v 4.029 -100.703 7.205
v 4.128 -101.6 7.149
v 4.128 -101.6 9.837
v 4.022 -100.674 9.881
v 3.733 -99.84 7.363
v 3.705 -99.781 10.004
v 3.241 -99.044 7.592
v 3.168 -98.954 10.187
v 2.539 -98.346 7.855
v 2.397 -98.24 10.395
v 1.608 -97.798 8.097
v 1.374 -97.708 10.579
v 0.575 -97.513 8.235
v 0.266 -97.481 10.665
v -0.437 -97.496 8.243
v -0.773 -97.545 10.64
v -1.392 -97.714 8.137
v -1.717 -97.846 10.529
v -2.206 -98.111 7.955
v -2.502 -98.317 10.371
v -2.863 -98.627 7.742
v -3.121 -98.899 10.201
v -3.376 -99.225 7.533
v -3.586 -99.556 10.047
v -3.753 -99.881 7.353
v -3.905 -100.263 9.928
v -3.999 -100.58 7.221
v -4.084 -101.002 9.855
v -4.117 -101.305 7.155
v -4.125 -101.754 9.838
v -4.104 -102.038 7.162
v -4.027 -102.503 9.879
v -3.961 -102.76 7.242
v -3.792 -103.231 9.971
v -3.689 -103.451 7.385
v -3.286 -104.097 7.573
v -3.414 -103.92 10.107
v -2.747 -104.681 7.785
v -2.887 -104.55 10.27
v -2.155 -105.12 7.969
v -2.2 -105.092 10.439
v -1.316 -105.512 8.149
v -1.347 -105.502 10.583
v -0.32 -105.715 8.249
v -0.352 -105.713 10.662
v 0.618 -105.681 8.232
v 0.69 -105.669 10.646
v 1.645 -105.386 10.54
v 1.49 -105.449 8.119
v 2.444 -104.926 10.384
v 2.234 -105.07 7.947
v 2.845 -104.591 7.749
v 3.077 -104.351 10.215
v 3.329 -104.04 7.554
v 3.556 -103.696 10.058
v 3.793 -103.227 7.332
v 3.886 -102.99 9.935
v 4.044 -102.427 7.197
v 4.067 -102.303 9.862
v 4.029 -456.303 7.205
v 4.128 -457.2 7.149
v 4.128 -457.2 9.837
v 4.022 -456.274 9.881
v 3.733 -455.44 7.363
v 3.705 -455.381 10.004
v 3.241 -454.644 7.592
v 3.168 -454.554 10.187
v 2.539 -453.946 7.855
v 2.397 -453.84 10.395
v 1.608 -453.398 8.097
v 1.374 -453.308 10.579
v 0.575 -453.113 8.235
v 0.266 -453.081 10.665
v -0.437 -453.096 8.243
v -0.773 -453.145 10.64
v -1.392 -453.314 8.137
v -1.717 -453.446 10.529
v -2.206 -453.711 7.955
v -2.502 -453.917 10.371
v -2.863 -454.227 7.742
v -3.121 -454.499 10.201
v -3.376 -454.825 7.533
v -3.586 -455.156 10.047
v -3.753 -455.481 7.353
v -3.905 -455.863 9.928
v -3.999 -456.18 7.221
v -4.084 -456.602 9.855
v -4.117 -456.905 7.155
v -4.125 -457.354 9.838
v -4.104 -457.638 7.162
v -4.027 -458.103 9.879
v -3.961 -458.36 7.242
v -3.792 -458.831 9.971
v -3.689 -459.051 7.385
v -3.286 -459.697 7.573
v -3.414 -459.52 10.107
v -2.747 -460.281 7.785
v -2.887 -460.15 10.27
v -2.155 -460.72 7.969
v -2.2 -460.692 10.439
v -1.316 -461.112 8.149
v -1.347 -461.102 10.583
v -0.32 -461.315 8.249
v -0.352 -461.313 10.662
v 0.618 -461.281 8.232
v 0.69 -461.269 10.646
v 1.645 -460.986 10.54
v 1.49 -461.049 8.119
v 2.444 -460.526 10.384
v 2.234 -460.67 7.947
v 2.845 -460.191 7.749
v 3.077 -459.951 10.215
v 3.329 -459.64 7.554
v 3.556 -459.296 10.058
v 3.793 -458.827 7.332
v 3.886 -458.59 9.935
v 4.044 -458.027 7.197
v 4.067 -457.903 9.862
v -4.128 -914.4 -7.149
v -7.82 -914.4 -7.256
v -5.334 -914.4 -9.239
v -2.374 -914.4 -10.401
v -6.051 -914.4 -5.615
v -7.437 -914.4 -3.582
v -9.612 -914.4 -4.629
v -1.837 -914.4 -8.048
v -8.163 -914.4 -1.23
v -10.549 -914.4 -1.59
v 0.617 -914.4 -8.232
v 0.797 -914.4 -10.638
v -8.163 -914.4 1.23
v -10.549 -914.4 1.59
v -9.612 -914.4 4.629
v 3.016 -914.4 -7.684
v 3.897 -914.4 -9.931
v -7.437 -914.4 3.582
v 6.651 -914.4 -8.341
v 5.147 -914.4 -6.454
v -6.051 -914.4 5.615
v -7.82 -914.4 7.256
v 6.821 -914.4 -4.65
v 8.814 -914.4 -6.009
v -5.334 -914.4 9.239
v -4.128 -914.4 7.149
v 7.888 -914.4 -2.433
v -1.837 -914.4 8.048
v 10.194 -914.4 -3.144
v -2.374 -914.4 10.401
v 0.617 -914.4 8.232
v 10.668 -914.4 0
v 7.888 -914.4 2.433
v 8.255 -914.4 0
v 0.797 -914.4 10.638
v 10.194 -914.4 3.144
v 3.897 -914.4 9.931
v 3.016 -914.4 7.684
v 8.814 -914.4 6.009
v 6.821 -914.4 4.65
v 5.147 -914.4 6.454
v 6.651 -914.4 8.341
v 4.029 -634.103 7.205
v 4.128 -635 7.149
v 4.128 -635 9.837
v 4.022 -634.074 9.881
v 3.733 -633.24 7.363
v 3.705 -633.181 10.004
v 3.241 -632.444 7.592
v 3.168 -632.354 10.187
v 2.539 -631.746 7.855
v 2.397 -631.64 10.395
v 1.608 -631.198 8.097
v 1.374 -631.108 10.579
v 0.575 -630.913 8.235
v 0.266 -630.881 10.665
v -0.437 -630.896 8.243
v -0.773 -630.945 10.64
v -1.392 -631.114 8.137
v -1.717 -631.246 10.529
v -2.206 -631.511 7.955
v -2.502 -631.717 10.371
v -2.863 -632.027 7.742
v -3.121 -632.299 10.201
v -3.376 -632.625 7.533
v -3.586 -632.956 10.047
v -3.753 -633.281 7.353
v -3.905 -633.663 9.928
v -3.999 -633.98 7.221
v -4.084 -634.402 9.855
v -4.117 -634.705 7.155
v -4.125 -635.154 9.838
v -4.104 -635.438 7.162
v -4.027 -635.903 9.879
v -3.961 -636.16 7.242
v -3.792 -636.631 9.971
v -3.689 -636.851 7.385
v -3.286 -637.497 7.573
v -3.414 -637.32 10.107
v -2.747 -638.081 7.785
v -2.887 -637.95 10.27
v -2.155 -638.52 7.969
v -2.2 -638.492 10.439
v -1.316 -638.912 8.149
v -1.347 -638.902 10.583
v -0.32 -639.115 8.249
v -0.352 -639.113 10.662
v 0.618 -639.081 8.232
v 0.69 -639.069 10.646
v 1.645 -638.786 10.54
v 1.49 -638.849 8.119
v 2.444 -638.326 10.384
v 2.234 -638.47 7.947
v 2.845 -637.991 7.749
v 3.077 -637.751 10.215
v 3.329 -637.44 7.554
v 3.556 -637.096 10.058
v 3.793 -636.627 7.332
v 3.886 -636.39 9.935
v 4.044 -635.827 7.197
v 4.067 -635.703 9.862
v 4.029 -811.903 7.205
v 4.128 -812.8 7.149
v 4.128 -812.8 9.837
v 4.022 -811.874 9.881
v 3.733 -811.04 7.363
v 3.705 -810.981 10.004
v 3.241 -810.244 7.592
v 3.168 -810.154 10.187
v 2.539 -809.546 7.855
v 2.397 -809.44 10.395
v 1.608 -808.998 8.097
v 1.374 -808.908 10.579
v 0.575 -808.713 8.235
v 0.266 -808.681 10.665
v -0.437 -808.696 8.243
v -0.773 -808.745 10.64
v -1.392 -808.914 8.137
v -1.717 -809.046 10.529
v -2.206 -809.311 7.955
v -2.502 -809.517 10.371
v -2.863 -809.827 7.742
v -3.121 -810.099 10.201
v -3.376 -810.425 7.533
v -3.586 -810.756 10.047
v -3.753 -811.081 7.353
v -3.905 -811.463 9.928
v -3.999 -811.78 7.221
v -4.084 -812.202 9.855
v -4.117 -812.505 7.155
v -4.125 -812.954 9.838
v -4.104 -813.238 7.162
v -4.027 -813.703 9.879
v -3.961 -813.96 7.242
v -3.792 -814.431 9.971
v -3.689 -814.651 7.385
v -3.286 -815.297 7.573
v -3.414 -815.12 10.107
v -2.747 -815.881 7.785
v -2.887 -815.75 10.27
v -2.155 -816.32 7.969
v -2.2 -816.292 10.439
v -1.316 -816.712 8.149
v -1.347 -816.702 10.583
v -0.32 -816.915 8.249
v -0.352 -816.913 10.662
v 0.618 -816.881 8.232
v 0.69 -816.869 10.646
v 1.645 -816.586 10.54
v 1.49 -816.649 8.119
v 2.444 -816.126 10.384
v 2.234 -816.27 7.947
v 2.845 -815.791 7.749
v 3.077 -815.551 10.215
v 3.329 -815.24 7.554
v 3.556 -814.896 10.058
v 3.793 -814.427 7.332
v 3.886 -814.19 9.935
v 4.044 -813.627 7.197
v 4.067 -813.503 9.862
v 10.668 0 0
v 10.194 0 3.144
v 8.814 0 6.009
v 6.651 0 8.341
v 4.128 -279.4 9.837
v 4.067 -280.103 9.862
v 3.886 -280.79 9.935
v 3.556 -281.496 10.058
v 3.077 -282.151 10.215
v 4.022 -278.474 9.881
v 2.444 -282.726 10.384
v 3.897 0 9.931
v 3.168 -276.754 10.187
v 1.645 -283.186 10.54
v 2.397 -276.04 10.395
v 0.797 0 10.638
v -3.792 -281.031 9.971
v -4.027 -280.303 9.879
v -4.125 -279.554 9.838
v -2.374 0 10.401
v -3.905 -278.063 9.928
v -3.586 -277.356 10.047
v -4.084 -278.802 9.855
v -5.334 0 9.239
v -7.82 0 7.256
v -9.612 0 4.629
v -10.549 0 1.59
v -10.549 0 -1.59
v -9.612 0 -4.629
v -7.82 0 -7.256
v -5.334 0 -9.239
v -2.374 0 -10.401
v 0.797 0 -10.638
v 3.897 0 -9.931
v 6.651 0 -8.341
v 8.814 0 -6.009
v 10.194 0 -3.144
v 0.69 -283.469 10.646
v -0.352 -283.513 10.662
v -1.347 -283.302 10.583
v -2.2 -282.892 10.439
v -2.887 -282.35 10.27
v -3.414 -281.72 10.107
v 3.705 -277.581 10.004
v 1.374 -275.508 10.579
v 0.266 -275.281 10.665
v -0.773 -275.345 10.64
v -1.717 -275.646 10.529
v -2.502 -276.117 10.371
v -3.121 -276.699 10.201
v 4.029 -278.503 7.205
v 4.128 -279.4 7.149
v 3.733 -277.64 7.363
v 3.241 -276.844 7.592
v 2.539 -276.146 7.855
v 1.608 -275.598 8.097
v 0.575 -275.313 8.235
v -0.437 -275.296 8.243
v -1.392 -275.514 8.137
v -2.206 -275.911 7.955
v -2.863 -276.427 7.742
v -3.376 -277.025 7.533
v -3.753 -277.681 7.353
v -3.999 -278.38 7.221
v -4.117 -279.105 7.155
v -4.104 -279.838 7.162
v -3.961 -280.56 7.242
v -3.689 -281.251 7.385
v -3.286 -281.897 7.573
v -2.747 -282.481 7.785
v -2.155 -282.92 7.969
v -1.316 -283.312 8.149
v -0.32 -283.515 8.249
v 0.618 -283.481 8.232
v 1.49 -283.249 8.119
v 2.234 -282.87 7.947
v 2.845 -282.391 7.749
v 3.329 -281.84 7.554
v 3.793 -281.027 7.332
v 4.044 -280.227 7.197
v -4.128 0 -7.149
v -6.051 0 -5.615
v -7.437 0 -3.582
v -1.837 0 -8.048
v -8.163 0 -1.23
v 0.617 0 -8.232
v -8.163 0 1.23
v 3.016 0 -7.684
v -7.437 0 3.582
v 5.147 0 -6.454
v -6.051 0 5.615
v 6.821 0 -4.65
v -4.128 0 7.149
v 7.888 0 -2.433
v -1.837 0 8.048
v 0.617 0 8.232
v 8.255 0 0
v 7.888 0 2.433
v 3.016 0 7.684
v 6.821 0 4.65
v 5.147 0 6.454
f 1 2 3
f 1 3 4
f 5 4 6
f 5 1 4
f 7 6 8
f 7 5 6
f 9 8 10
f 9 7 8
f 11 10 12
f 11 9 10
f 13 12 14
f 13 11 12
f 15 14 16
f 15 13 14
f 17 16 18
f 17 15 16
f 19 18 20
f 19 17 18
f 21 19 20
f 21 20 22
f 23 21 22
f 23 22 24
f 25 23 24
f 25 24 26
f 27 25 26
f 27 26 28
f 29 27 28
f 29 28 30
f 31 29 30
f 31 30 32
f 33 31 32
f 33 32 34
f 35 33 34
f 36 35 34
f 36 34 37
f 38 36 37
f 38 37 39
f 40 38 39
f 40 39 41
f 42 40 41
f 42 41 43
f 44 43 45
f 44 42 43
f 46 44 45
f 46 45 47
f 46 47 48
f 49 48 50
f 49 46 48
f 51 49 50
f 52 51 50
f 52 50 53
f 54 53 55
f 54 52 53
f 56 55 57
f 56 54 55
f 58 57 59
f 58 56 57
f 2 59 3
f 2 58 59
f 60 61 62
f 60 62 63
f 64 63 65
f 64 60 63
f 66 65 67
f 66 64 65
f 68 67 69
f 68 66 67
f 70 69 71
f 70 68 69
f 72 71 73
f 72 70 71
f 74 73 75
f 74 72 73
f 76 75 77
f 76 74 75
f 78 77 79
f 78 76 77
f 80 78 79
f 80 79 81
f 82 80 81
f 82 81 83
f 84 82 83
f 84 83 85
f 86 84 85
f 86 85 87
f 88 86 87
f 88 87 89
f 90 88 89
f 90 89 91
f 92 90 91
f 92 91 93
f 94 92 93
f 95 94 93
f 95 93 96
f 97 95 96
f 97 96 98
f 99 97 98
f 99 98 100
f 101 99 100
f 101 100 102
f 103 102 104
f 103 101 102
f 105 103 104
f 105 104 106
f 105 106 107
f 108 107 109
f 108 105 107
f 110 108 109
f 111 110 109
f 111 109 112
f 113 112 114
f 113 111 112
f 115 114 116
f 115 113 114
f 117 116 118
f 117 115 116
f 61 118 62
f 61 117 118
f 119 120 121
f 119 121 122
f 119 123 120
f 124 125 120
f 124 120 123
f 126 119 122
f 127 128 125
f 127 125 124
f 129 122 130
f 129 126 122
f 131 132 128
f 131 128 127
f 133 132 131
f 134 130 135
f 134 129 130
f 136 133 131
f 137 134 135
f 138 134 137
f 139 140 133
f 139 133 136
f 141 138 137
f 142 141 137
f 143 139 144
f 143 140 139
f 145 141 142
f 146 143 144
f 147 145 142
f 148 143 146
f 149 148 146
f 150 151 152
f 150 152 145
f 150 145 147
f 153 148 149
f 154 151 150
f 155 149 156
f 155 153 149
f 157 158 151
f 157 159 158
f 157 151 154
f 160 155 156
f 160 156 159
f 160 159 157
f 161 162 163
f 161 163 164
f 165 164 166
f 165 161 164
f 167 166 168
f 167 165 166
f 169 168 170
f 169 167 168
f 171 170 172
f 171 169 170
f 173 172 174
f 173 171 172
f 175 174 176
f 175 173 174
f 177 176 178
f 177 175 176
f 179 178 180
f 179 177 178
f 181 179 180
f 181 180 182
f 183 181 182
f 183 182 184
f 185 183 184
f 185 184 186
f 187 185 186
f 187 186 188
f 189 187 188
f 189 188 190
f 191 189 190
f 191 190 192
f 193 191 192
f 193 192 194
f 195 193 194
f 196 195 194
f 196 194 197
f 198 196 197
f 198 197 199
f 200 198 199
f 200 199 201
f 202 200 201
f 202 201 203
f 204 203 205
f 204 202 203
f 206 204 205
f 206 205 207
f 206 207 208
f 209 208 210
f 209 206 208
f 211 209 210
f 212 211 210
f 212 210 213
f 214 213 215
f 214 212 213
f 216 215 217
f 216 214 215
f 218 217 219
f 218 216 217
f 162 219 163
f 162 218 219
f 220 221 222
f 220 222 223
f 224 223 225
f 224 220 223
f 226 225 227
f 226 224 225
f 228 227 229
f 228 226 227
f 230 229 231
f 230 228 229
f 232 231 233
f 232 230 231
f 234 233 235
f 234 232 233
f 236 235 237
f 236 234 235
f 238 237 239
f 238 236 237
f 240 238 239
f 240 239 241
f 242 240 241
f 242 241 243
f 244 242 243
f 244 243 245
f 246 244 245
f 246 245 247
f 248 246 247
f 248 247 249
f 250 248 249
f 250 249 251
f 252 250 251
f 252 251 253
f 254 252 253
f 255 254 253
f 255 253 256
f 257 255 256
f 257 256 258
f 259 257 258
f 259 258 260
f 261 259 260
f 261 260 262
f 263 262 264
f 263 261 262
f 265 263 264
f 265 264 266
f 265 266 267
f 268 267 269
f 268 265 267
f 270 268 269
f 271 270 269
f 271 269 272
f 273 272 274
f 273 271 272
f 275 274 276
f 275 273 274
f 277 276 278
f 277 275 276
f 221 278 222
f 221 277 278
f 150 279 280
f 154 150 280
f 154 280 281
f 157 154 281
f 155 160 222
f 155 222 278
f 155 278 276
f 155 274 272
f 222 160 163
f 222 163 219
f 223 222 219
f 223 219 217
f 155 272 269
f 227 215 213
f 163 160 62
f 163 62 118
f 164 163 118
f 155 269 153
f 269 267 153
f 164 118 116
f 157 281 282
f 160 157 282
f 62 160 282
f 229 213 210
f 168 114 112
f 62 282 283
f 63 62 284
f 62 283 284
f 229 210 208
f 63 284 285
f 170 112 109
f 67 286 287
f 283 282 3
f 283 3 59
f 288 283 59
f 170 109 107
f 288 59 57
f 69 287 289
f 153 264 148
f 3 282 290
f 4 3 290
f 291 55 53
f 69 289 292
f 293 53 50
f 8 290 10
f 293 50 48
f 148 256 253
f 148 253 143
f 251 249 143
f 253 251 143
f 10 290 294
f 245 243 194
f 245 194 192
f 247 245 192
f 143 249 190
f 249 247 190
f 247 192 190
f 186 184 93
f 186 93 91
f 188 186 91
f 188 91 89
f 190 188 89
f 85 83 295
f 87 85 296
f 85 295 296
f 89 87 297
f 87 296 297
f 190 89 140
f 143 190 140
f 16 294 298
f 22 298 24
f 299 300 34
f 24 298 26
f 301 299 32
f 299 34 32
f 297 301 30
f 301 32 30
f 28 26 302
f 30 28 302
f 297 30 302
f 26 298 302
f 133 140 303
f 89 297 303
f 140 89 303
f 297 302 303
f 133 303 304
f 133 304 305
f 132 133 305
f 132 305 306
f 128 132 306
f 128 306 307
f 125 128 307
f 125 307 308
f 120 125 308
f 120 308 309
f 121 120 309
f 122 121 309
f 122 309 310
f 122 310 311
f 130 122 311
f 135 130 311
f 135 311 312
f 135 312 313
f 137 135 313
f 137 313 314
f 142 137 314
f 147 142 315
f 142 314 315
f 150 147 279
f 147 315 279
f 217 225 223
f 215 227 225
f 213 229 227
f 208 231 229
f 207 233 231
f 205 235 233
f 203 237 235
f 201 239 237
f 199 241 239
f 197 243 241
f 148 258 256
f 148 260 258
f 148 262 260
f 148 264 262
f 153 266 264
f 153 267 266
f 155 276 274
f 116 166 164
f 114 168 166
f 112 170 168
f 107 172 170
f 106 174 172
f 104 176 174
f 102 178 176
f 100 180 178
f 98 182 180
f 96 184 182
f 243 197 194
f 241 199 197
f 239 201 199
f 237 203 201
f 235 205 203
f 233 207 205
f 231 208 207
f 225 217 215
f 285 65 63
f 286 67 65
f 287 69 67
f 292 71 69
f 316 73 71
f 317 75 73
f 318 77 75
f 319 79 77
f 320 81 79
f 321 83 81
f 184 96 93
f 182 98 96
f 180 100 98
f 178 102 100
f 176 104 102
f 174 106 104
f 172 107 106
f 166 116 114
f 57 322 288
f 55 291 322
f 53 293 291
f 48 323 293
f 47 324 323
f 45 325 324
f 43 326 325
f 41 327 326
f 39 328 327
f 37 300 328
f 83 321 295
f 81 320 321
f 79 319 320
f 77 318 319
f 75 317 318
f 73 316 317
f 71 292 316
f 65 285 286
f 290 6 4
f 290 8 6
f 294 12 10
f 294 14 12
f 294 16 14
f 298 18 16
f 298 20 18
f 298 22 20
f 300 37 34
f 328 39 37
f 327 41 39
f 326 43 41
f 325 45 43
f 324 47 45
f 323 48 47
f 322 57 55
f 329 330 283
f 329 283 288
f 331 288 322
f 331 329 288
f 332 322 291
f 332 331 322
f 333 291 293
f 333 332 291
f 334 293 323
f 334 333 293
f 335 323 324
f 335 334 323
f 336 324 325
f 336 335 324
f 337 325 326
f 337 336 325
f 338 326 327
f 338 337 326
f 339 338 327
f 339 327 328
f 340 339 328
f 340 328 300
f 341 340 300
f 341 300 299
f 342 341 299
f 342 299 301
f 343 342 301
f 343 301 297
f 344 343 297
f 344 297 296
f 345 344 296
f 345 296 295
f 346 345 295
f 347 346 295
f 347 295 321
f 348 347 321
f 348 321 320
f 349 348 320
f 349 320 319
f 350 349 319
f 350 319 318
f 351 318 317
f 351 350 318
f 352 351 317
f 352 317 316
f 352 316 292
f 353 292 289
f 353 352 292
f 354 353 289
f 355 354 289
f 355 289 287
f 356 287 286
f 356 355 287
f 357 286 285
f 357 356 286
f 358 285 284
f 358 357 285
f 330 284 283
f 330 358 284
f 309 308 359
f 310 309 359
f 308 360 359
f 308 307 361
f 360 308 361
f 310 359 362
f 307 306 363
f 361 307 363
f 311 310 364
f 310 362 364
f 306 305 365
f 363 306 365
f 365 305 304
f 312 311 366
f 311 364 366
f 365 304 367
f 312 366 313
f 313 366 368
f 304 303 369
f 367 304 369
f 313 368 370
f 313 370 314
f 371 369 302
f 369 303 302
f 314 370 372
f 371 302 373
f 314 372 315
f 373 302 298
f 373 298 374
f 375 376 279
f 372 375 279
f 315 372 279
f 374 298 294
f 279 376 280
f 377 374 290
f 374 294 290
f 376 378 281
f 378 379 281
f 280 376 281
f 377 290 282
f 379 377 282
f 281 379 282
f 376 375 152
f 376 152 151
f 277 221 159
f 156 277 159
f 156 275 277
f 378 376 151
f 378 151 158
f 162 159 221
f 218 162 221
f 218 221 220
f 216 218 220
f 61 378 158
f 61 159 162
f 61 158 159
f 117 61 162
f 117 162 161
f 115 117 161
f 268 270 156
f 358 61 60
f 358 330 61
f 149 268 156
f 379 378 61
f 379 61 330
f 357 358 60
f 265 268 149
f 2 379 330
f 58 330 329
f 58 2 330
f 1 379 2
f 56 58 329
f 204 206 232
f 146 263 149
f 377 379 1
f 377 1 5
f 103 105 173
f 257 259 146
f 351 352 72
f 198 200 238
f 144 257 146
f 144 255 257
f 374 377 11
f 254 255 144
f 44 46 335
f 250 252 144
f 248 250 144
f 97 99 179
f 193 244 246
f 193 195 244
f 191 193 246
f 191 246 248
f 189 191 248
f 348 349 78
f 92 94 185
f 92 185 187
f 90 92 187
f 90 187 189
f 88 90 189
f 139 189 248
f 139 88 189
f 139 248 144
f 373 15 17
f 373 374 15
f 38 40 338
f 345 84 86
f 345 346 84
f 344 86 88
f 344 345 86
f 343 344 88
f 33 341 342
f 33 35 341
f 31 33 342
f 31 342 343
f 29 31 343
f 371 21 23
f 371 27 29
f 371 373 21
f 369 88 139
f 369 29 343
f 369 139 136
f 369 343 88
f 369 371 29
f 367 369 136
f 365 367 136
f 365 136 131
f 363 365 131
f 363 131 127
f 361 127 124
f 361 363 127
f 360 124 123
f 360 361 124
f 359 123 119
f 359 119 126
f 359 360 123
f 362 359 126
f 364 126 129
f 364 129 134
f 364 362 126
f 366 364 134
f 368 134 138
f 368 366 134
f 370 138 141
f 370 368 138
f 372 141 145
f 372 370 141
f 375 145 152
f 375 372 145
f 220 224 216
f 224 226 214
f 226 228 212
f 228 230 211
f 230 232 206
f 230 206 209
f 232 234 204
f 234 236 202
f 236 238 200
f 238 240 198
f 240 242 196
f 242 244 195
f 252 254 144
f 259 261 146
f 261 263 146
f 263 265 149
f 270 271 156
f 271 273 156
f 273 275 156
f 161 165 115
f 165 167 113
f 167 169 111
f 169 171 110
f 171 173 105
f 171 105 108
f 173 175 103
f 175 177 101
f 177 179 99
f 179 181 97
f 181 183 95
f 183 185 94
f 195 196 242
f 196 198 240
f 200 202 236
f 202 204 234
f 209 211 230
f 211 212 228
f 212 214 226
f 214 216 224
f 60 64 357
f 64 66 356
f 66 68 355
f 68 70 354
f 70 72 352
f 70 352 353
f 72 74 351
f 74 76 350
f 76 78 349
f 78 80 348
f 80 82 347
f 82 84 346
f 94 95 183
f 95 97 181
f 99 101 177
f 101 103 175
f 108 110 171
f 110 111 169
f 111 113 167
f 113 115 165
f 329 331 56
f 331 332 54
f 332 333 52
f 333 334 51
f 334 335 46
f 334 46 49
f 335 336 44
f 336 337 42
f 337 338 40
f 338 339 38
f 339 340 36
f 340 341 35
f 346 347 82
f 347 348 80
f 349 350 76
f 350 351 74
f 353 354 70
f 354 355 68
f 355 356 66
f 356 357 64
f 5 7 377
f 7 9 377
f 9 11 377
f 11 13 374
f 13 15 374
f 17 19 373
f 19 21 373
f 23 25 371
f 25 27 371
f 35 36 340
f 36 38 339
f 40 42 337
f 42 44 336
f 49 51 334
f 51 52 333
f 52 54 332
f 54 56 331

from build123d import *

# Parameters (mm, degrees)
F0_R     = 10.668
F0_R_2   = 8.255
F1_DEPTH = 914.4
F2_R     = 4.1275
F3_DEPTH = 25.4


with BuildPart() as f1:
    # F0 (on Front) → F1 (new body)
    with BuildSketch(Plane.XZ):
        Circle(F0_R)
        Circle(F0_R_2, mode=Mode.SUBTRACT)
    extrude(amount=F1_DEPTH)

    # F2 (on Top) → F3 (cut)
    with BuildSketch(Plane.XY):
        with Locations((0, -101.6)):
            Circle(F2_R)
        with Locations((0, -279.4)):
            Circle(F2_R)
        with Locations((0, -457.2)):
            Circle(F2_R)
        with Locations((0, -635)):
            Circle(F2_R)
        with Locations((0, -812.8)):
            Circle(F2_R)
    extrude(amount=F3_DEPTH, mode=Mode.SUBTRACT)


solid = f1.part
